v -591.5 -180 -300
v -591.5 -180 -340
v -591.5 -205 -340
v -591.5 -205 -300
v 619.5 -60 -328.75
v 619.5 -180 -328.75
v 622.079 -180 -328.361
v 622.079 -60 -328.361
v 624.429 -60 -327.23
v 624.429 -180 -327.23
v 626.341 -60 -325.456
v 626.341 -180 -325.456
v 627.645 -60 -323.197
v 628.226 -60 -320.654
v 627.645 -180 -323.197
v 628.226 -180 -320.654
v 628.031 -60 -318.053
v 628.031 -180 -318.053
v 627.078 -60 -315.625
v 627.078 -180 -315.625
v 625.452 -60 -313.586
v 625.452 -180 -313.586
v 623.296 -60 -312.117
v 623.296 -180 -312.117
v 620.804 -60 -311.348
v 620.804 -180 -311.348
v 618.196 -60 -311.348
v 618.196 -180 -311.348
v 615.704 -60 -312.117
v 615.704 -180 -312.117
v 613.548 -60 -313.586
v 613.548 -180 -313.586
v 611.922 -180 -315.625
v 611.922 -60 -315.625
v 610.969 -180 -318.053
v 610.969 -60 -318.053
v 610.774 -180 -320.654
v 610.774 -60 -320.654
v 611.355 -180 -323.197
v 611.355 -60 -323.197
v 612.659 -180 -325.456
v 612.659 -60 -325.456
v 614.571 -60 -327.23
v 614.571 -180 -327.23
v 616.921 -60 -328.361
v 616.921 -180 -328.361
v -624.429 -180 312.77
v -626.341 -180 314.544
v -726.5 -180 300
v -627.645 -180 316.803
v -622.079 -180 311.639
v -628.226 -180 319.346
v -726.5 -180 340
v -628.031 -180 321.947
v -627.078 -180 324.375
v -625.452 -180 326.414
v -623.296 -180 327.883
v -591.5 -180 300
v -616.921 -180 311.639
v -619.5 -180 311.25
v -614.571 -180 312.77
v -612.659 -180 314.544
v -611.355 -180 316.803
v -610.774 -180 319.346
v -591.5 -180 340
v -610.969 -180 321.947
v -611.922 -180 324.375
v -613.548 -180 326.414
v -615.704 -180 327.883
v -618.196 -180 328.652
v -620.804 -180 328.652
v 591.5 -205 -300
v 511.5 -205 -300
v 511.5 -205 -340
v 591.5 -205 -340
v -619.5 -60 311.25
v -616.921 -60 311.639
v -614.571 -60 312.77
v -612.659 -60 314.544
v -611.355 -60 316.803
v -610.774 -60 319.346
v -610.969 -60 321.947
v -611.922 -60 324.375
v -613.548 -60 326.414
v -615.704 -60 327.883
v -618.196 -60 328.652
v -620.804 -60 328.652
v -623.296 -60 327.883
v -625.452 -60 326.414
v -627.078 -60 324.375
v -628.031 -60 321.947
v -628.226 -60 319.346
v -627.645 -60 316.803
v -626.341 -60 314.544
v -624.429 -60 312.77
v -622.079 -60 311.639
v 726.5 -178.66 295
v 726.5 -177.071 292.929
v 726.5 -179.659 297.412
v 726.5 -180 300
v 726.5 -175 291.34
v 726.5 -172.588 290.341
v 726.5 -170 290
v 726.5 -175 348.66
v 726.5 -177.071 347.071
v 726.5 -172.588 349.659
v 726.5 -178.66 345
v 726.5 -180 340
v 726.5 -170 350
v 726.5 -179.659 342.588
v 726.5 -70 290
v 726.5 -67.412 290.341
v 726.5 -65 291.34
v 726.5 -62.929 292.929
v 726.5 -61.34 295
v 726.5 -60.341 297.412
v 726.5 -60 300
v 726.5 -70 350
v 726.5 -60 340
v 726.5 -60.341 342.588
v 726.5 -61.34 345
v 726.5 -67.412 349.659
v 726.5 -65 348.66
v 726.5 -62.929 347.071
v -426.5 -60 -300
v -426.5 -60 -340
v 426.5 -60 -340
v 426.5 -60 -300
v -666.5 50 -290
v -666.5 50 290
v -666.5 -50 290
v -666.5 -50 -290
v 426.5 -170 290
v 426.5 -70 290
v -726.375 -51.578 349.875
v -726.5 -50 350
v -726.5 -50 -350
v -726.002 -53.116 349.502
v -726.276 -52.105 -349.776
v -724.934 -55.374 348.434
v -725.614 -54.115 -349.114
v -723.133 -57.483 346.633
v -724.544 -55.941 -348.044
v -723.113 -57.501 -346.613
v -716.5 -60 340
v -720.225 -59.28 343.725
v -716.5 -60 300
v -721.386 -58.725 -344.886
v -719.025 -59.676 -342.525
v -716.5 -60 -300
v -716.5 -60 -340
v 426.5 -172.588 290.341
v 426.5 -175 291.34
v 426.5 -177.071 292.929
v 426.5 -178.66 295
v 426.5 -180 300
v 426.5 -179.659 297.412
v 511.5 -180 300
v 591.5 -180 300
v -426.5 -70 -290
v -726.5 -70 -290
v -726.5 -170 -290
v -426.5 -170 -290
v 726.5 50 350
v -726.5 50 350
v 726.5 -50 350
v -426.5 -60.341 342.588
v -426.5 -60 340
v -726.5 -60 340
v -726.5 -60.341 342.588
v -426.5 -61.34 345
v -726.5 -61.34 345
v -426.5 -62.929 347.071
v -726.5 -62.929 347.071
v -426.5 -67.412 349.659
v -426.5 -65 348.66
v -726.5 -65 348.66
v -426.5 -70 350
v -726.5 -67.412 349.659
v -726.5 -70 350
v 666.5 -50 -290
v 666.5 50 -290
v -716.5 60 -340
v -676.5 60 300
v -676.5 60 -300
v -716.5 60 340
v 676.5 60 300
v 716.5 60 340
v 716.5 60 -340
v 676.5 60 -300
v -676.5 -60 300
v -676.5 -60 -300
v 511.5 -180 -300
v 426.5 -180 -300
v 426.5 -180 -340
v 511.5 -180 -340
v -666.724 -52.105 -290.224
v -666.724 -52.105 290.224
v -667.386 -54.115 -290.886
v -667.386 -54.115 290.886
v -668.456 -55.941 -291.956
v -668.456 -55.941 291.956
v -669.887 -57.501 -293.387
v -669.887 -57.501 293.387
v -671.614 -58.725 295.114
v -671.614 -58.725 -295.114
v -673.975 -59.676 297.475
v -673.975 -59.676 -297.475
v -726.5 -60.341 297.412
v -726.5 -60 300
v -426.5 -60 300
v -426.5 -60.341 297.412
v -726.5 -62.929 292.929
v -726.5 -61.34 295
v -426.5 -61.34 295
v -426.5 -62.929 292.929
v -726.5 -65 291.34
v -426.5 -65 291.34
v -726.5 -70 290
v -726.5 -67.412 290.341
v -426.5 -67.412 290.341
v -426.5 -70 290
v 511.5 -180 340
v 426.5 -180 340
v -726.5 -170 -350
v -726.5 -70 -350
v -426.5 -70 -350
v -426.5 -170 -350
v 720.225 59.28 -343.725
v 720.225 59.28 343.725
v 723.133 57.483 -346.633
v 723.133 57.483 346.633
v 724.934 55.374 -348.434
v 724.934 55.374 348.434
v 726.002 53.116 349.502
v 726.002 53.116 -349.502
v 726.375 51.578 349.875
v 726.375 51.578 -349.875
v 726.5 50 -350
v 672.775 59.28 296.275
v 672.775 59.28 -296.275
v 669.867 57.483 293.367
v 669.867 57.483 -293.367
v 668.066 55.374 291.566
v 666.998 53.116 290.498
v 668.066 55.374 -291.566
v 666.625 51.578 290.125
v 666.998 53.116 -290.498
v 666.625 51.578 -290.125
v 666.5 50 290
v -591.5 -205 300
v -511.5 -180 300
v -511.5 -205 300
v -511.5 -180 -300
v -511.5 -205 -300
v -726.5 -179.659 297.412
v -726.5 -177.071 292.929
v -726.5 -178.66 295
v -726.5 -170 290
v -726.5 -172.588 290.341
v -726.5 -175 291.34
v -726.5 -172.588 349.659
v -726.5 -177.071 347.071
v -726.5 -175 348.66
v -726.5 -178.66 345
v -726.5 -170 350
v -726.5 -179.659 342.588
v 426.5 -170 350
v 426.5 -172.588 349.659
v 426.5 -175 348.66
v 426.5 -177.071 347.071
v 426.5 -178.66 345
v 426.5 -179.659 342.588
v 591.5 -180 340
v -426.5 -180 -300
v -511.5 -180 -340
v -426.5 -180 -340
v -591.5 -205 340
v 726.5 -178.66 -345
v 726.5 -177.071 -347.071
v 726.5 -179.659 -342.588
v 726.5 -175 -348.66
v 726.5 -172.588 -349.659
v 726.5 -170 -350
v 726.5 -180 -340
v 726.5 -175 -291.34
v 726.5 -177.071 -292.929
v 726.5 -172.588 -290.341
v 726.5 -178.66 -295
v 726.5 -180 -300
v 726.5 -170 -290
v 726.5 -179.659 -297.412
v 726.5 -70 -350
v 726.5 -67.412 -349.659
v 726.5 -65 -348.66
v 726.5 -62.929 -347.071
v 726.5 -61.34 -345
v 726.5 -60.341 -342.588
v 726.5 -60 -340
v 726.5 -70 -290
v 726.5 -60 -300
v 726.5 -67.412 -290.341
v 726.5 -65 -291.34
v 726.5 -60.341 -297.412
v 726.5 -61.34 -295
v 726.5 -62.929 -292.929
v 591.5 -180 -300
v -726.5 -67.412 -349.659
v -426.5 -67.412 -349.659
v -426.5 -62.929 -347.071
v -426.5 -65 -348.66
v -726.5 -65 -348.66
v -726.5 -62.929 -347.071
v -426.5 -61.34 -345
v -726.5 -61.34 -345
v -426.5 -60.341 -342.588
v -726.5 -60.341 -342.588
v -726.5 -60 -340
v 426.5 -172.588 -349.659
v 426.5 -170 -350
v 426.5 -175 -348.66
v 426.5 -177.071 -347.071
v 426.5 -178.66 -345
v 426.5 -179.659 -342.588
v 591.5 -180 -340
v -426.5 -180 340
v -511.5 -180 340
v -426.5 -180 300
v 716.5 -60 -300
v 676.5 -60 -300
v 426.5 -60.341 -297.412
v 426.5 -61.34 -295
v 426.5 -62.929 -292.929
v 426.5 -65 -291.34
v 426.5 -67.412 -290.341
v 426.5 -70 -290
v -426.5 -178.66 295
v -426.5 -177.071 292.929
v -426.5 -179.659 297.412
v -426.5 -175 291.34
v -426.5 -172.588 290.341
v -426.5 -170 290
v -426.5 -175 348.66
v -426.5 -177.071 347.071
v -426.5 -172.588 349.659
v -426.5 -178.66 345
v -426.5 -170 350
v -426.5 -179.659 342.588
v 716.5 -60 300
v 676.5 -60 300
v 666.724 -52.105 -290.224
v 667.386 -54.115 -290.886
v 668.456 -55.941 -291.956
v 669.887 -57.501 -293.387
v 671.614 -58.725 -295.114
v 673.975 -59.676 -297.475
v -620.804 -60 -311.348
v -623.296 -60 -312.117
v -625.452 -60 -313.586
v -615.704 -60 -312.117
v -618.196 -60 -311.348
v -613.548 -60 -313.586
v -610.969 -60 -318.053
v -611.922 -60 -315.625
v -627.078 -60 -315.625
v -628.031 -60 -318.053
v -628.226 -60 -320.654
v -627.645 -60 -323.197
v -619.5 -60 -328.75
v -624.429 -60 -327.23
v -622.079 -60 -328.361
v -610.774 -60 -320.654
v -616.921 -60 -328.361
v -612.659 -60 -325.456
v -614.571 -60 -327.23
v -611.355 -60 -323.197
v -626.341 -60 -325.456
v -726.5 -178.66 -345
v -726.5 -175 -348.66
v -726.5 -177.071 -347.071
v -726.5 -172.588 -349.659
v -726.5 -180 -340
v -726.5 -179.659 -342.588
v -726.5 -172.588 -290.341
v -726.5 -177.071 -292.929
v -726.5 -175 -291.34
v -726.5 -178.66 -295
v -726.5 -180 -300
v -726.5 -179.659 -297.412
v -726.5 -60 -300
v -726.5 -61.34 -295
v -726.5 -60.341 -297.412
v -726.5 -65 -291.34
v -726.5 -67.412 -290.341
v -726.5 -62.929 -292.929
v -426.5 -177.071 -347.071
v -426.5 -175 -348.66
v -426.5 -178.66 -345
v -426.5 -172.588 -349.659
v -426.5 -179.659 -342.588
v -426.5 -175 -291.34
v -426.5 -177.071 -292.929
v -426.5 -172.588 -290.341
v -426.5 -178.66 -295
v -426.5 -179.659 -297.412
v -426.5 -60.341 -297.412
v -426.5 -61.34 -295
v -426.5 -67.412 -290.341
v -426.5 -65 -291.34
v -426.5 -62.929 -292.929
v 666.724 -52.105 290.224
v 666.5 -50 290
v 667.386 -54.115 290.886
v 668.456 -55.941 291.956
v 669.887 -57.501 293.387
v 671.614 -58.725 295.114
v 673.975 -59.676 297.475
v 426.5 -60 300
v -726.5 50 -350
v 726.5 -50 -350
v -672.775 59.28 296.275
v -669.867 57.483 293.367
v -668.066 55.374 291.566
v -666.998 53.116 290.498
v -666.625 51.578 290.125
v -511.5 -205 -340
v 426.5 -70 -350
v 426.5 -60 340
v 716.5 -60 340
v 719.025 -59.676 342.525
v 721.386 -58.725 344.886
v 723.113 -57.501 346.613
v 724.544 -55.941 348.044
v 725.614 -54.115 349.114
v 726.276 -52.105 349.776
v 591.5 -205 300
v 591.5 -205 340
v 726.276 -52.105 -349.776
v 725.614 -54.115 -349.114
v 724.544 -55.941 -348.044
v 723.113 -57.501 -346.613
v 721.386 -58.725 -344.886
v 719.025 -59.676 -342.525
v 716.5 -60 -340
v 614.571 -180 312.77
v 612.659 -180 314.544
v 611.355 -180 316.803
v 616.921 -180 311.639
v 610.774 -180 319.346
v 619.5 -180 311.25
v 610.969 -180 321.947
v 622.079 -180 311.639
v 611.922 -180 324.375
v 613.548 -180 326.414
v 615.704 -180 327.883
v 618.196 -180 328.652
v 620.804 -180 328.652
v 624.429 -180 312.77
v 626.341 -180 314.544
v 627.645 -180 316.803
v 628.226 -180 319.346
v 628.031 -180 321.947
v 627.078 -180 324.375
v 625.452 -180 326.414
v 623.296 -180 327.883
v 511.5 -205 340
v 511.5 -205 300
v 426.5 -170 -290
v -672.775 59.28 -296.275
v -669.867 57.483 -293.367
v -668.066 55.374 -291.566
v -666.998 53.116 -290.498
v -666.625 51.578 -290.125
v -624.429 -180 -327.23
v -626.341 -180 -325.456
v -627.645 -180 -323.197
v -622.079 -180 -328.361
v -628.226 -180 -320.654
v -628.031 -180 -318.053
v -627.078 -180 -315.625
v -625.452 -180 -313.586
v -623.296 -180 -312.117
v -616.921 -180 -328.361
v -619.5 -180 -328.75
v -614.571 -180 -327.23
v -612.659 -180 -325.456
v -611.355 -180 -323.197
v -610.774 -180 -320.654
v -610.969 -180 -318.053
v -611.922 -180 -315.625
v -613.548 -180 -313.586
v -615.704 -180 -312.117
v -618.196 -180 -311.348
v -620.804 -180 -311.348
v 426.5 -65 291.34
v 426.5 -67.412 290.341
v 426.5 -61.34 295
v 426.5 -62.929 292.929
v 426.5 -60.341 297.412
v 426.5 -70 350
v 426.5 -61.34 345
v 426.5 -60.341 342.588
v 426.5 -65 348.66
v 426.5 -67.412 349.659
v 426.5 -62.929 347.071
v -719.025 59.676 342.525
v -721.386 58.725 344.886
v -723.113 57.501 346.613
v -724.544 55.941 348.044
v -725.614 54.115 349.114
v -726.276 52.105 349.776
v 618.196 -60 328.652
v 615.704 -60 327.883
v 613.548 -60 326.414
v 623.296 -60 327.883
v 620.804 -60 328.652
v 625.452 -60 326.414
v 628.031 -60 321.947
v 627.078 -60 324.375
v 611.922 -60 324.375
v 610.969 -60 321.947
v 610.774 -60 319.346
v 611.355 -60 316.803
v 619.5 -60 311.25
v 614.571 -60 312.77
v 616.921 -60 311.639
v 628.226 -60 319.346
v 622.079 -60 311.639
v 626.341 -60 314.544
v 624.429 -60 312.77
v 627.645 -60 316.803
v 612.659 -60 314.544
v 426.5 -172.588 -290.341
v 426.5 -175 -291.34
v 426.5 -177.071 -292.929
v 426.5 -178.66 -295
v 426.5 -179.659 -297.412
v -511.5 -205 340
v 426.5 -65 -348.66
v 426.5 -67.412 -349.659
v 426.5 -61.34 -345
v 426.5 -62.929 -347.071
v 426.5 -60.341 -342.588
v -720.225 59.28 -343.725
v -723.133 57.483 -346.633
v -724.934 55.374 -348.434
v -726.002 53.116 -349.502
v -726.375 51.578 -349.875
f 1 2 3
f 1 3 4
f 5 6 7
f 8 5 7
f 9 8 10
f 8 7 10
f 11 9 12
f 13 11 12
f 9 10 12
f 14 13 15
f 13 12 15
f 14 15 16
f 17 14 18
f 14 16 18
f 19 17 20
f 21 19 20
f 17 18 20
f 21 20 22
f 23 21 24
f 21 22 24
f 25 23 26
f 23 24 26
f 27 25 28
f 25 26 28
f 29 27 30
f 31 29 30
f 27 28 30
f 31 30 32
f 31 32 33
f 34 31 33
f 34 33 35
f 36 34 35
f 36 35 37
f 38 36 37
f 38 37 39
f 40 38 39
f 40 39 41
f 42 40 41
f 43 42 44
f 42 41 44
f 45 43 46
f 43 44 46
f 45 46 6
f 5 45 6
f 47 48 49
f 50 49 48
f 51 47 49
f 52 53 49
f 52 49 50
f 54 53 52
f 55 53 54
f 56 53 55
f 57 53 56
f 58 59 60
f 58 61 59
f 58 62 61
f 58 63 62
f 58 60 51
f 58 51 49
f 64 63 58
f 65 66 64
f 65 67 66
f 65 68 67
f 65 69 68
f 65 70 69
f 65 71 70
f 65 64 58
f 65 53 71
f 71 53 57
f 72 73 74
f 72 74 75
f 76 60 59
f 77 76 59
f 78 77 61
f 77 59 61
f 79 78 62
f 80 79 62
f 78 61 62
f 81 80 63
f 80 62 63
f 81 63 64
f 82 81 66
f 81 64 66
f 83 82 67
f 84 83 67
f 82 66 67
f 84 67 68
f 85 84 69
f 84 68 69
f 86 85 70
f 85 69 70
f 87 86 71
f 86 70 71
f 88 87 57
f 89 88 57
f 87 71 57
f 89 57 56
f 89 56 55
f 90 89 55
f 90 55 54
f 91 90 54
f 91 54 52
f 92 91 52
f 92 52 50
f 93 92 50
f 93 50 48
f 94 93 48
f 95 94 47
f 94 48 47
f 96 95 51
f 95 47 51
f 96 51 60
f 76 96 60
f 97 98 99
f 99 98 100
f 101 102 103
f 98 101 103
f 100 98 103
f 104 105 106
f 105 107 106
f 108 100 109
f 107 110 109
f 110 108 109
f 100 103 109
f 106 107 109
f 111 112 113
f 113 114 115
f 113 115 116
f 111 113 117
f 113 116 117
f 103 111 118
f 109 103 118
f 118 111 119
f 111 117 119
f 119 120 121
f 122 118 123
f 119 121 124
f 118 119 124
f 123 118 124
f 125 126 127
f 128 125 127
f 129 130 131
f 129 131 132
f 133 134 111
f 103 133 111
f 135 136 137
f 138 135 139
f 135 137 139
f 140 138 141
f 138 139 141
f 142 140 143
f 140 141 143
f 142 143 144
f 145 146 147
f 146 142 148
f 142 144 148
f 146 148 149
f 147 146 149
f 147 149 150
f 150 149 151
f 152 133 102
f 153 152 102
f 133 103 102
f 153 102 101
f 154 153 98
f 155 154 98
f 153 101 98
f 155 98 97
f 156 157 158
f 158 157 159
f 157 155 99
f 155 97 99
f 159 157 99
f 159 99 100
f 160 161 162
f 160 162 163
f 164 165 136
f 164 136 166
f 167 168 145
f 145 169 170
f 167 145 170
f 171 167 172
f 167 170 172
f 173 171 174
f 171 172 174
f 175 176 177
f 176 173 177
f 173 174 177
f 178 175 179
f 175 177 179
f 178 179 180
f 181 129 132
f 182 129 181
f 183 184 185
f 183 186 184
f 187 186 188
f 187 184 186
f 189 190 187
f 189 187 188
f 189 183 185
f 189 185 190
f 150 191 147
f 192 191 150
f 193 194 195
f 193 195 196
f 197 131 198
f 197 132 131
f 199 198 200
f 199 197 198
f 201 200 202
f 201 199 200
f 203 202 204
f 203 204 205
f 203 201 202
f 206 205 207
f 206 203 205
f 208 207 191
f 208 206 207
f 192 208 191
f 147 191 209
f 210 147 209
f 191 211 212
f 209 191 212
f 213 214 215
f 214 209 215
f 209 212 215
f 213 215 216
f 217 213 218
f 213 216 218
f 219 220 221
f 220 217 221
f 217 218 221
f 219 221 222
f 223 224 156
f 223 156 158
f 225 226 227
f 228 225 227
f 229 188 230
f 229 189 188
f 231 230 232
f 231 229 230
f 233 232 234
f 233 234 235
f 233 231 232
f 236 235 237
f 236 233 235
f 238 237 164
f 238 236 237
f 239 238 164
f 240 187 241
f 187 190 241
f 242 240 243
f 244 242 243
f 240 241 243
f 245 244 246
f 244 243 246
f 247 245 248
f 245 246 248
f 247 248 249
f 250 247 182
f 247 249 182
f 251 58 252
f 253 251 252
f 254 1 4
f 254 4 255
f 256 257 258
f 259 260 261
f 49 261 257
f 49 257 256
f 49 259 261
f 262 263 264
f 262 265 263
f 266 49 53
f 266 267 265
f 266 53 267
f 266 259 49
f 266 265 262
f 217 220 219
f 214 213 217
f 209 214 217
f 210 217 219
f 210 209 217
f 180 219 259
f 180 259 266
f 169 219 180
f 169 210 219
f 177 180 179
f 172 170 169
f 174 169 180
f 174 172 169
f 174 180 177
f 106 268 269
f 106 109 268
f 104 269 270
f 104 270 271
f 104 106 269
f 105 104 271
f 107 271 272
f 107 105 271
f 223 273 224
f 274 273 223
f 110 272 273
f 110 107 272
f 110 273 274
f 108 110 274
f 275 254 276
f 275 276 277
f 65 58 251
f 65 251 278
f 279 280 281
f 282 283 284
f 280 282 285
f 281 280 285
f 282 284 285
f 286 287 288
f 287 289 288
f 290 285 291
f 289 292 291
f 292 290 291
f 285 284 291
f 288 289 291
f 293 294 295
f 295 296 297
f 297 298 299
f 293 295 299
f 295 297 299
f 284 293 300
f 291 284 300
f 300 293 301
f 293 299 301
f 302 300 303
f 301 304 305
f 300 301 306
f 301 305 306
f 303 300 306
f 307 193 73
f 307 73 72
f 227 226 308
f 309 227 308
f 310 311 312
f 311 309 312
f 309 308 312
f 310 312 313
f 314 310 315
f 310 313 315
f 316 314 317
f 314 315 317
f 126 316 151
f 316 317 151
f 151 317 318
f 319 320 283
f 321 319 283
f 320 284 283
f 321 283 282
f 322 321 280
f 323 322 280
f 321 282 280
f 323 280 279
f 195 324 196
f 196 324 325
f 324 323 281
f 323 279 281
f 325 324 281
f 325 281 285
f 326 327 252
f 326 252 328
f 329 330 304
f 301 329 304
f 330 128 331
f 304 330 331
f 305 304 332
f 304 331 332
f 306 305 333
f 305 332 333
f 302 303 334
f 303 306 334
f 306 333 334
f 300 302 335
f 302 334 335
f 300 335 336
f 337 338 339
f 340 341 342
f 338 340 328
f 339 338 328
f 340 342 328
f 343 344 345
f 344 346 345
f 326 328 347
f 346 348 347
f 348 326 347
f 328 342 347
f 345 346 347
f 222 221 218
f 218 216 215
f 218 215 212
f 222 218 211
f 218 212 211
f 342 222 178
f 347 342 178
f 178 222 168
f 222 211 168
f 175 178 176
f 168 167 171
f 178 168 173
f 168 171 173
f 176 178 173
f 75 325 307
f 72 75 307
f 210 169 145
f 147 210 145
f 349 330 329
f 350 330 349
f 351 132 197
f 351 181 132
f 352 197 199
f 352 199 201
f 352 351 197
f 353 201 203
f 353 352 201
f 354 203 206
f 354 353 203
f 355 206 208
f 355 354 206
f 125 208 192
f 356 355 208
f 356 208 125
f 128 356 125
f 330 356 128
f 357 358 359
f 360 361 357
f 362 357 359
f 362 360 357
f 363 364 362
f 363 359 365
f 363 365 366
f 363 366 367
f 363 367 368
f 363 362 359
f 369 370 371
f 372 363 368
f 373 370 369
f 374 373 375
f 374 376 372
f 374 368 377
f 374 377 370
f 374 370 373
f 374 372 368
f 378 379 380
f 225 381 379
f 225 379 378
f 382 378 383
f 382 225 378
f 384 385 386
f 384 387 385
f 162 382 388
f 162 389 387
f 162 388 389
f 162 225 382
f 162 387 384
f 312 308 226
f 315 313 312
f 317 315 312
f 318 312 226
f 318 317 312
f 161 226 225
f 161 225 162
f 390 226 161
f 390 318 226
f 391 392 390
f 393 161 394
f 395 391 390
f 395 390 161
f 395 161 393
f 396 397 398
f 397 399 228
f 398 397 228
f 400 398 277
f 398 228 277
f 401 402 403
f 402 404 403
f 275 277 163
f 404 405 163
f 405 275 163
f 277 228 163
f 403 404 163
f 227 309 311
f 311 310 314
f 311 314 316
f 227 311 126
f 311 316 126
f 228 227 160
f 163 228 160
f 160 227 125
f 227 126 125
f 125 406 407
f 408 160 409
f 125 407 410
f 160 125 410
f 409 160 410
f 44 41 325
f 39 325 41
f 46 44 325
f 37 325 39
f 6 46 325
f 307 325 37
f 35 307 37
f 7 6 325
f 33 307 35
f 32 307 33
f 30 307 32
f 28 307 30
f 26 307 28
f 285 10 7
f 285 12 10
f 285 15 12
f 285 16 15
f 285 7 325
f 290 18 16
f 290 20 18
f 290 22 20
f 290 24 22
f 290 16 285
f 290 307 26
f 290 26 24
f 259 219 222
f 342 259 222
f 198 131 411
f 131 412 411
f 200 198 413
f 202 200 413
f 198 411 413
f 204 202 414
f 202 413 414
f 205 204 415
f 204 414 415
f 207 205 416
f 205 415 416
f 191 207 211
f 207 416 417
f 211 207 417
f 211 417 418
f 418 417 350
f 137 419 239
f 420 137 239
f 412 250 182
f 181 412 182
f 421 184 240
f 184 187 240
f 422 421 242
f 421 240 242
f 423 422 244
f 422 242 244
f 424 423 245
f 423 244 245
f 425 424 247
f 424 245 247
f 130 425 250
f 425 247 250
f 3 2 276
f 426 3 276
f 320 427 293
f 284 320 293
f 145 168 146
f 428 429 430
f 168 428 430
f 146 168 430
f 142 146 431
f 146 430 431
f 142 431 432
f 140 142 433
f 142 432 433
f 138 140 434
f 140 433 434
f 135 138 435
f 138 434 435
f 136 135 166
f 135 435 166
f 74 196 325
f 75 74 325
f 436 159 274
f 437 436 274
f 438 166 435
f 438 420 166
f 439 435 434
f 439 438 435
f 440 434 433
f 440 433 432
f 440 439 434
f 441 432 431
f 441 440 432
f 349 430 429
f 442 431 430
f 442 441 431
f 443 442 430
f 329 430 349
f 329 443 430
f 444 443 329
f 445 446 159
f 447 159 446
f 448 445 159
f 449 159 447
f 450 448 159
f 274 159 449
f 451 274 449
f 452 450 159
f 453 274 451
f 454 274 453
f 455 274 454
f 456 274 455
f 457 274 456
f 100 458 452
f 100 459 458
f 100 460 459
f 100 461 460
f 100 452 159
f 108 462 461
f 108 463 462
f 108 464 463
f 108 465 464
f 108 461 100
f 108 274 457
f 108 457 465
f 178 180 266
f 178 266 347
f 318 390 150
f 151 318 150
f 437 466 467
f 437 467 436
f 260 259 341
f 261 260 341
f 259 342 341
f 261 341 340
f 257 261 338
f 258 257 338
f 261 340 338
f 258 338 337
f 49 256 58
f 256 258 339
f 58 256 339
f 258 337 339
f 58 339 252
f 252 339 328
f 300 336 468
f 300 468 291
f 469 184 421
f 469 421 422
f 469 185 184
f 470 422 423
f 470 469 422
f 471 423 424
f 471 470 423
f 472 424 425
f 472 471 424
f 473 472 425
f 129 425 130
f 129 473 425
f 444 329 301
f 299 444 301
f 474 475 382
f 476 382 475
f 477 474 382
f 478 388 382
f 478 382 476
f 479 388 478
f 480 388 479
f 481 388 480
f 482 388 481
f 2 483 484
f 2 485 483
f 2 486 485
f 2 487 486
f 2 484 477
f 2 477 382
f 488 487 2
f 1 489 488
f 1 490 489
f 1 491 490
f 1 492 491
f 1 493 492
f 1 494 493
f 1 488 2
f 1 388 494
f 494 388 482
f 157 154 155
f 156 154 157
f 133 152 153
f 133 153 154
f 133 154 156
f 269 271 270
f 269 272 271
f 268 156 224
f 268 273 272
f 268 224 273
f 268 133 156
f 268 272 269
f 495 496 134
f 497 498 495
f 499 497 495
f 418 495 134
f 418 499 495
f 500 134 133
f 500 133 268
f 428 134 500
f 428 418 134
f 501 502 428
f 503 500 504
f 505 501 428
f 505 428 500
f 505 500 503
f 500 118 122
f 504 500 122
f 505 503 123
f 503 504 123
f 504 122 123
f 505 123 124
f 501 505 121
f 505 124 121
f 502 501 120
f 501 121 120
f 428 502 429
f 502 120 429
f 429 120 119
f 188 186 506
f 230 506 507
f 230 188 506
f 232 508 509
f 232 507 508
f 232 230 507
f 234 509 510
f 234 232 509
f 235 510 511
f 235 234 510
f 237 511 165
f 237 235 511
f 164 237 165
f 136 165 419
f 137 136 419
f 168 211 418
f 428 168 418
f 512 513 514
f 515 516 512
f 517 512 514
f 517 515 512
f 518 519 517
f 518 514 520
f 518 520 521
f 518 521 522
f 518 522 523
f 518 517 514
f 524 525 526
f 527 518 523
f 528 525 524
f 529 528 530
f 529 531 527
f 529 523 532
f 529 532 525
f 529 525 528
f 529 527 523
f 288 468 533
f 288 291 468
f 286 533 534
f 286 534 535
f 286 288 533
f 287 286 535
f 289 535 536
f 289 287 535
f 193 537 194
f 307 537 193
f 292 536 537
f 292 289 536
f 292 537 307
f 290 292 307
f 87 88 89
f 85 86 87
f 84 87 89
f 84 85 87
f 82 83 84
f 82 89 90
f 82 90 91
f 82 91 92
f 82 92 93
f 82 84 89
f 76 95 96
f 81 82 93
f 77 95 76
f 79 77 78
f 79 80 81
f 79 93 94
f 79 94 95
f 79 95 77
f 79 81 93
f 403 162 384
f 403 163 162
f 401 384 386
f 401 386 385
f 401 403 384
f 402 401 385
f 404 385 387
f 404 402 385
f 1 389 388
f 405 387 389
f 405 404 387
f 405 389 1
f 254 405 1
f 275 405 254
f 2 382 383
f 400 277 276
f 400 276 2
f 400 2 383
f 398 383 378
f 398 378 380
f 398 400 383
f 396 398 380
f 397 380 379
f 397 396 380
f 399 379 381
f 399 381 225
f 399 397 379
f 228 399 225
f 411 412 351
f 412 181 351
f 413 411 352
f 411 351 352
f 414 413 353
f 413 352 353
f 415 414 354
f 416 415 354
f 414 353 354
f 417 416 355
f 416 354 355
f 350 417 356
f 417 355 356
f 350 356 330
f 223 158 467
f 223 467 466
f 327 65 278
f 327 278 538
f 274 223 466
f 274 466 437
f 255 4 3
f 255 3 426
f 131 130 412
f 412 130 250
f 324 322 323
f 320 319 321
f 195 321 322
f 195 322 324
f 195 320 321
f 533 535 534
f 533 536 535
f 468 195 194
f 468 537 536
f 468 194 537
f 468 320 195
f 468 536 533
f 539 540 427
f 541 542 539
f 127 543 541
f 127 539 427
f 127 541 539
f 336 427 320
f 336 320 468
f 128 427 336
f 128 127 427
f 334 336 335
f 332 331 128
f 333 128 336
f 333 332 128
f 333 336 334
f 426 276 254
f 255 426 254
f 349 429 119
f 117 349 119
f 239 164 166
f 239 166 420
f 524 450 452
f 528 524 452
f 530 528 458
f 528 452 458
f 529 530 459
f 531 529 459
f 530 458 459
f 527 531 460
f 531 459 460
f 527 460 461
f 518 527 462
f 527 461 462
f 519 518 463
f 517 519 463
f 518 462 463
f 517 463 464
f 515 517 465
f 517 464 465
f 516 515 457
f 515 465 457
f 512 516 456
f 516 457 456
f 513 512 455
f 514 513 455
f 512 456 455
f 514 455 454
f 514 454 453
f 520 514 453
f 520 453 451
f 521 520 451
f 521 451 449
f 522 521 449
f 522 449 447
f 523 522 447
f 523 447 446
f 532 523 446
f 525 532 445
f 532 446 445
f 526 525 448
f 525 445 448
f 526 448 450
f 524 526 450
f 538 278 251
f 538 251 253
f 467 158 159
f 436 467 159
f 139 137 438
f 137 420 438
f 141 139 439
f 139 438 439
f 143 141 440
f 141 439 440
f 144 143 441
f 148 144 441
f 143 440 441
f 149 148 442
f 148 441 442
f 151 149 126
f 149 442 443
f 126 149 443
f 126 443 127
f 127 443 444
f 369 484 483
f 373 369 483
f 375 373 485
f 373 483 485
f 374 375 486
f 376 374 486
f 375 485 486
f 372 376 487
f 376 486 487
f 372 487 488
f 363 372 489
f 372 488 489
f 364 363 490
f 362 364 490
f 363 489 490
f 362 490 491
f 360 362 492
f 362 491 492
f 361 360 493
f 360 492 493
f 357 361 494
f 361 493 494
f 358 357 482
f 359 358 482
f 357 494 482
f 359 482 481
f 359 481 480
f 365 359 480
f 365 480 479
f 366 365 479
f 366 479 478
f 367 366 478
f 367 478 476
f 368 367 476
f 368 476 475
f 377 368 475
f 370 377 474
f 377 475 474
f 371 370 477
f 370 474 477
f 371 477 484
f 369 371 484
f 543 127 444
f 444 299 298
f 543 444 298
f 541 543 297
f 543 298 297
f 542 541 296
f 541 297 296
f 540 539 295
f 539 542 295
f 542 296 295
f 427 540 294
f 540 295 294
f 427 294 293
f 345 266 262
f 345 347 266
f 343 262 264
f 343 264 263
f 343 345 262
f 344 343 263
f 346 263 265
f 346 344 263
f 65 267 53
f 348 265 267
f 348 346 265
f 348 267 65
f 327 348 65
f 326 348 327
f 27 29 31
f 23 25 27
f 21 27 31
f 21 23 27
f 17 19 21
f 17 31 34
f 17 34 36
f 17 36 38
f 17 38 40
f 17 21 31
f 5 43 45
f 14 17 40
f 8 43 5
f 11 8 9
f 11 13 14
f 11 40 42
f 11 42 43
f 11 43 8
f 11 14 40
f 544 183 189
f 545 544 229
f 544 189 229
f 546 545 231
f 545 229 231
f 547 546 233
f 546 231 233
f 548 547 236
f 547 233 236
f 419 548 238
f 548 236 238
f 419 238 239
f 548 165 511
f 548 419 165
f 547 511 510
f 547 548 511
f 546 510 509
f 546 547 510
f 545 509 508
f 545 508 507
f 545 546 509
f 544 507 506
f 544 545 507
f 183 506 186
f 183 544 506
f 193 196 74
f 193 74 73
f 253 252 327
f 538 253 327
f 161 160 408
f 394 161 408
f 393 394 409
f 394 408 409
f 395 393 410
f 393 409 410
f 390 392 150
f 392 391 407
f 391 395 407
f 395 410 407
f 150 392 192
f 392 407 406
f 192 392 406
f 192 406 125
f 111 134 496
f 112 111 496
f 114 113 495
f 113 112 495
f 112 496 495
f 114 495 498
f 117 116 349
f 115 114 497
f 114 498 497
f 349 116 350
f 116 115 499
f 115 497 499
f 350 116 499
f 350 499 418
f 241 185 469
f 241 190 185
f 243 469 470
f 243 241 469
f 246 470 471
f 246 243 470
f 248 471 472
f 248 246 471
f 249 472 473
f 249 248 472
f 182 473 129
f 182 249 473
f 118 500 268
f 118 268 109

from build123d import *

# Parameters (mm, degrees)
SKIZZE1_W                       = 1453
SKIZZE1_H                       = 700
SKIZZE1_W_2                     = 1333
SKIZZE1_H_2                     = 580
AUFSATZ_LINEAR_AUSTRAGEN1_DEPTH = 60
VERRUNDUNG1_R                   = 10
SKIZZE2_W                       = 300
SKIZZE2_H                       = 60
AUFSATZ_LINEAR_AUSTRAGEN2_DEPTH = 120
VERRUNDUNG3_R                   = 10
VERRUNDUNG4_R                   = 10
SKIZZE3_R                       = 8.75
SCHNITT_LINEAR_AUSTRAGEN1_DEPTH = 120
SKIZZE4_W                       = 80
SKIZZE4_H                       = 40
AUFSATZ_LINEAR_AUSTRAGEN3_DEPTH = 25


with BuildPart() as part:
    # Skizze1 → Aufsatz-Linear austragen1 (new, symmetric)
    with BuildSketch(Plane(origin=(0, 0, 0), x_dir=(1, 0, 0), z_dir=(0, 1, 0))):
        Rectangle(SKIZZE1_W, SKIZZE1_H)
        Rectangle(SKIZZE1_W_2, SKIZZE1_H_2, mode=Mode.SUBTRACT)
    extrude(amount=AUFSATZ_LINEAR_AUSTRAGEN1_DEPTH, both=True)

    # Verrundung1
    verrundung1_edges = [part.edges().sort_by_distance(p)[0] for p in [
        (726.5, 60, 0),
        (0, 60, -350),
        (-666.5, -60, 0),
        (0, -60, 290),
        (666.5, -60, 0),
        (0, -60, -290),
        (-666.5, 60, 0),
        (0, 60, 290),
        (666.5, 60, 0),
        (0, 60, -290),
        (-726.5, 60, 0),
        (0, -60, -350),
        (726.5, -60, 0),
        (0, -60, 350),
        (-726.5, -60, 0),
        (0, 60, 350),
    ]]
    fillet(verrundung1_edges, radius=VERRUNDUNG1_R)

    # Skizze2 → Aufsatz-Linear austragen2 (add)
    with BuildSketch(Plane.XZ.offset(60)):
        with Locations((-576.5, 320)):
            Rectangle(SKIZZE2_W, SKIZZE2_H)
        with Locations((576.5, 320)):
            Rectangle(SKIZZE2_W, SKIZZE2_H)
        with Locations((576.5, -320)):
            Rectangle(SKIZZE2_W, SKIZZE2_H)
        with Locations((-576.5, -320)):
            Rectangle(SKIZZE2_W, SKIZZE2_H)
    extrude(amount=AUFSATZ_LINEAR_AUSTRAGEN2_DEPTH)

    # Verrundung3
    verrundung3_edges = [part.edges().sort_by_distance(p)[0] for p in [
        (576.5, -180, 290),
        (576.5, -180, -290),
        (576.5, -180, -350),
        (-576.5, -180, -350),
        (-576.5, -180, -290),
        (-576.5, -180, 290),
        (-576.5, -180, 350),
        (576.5, -180, 350),
    ]]
    fillet(verrundung3_edges, radius=VERRUNDUNG3_R)

    # Verrundung4
    # the kernel refuses this fillet: 10 mm, written as the material it adds along each edge
    # the kernel refuses this fillet: 10 mm, written as the material it takes off along each edge
    with BuildSketch(Plane(origin=(691.5, -60, -290), x_dir=(0, 0, -1), z_dir=(1, 0, 0)), Plane(origin=(-691.5, -60, -290), x_dir=(0, -1, 0), z_dir=(-1, 0, 0))) as verrundung4_2_piece_1:
        with BuildLine():
            CenterArc((VERRUNDUNG4_R, -VERRUNDUNG4_R), VERRUNDUNG4_R, 90, 90)
            Line((0, -VERRUNDUNG4_R), (0, 0))
            Line((0, 0), (VERRUNDUNG4_R, 0))
        make_face()
    extrude(amount=60, mode=Mode.SUBTRACT)
    with BuildSketch(Plane(origin=(401.5, -60, -290), x_dir=(0, 0, -1), z_dir=(1, 0, 0)), Plane(origin=(-401.5, -60, -290), x_dir=(0, -1, 0), z_dir=(-1, 0, 0))) as verrundung4_2_piece_2:
        with BuildLine():
            CenterArc((VERRUNDUNG4_R, -VERRUNDUNG4_R), VERRUNDUNG4_R, 90, 90)
            Line((0, -VERRUNDUNG4_R), (0, 0))
            Line((0, 0), (VERRUNDUNG4_R, 0))
        make_face()
    extrude(amount=300, mode=Mode.SUBTRACT)
    with BuildSketch(Plane(origin=(751.5, -60, -350), x_dir=(0, 0, 1), z_dir=(-1, 0, 0)), Plane(origin=(-751.5, -60, 350), x_dir=(0, 0, -1), z_dir=(1, 0, 0))) as verrundung4_2_piece_3:
        with BuildLine():
            CenterArc((VERRUNDUNG4_R, -VERRUNDUNG4_R), VERRUNDUNG4_R, 90, 90)
            Line((0, -VERRUNDUNG4_R), (0, 0))
            Line((0, 0), (VERRUNDUNG4_R, 0))
        make_face()
    extrude(amount=350, mode=Mode.SUBTRACT)
    with BuildSketch(Plane(origin=(-751.5, -60, -350), x_dir=(0, 0, 1), z_dir=(1, 0, 0)), Plane(origin=(751.5, -60, 350), x_dir=(0, 0, -1), z_dir=(-1, 0, 0))) as verrundung4_2_piece_4:
        with BuildLine():
            CenterArc((VERRUNDUNG4_R, VERRUNDUNG4_R), VERRUNDUNG4_R, 180, 90)
            Line((0, VERRUNDUNG4_R), (0, 0))
            Line((0, 0), (VERRUNDUNG4_R, 0))
        make_face()
    extrude(amount=350, mode=Mode.SUBTRACT)
    with BuildSketch(Plane(origin=(-691.5, -60, 290), x_dir=(0, -1, 0), z_dir=(-1, 0, 0)), Plane(origin=(691.5, -60, 290), x_dir=(0, 0, 1), z_dir=(1, 0, 0))) as verrundung4_2_piece_5:
        with BuildLine():
            CenterArc((VERRUNDUNG4_R, VERRUNDUNG4_R), VERRUNDUNG4_R, 180, 90)
            Line((0, VERRUNDUNG4_R), (0, 0))
            Line((0, 0), (VERRUNDUNG4_R, 0))
        make_face()
    extrude(amount=60, mode=Mode.SUBTRACT)
    with BuildSketch(Plane(origin=(-401.5, -60, 290), x_dir=(0, -1, 0), z_dir=(-1, 0, 0)), Plane(origin=(401.5, -60, 290), x_dir=(0, 0, 1), z_dir=(1, 0, 0))) as verrundung4_2_piece_6:
        with BuildLine():
            CenterArc((VERRUNDUNG4_R, VERRUNDUNG4_R), VERRUNDUNG4_R, 180, 90)
            Line((0, VERRUNDUNG4_R), (0, 0))
            Line((0, 0), (VERRUNDUNG4_R, 0))
        make_face()
    extrude(amount=300, mode=Mode.SUBTRACT)

    # Skizze3 → Schnitt-Linear austragen1 (cut)
    with BuildSketch(Plane.XZ.offset(180)):
        with Locations(Location((-619.5, 320, 0), (0, 0, 270))):
            Circle(SKIZZE3_R)
        with Locations(Location((-619.5, -320, 0), (0, 0, 270))):
            Circle(SKIZZE3_R)
        with Locations(Location((619.5, 320, 0), (0, 0, 270))):
            Circle(SKIZZE3_R)
        with Locations(Location((619.5, -320, 0), (0, 0, 270))):
            Circle(SKIZZE3_R)
    extrude(amount=-SCHNITT_LINEAR_AUSTRAGEN1_DEPTH, mode=Mode.SUBTRACT)

    # Skizze4 → Aufsatz-Linear austragen3 (add)
    with BuildSketch(Plane.XZ.offset(180)):
        with Locations((-551.5, 320)):
            Rectangle(SKIZZE4_W, SKIZZE4_H)
        with Locations((551.5, 320)):
            Rectangle(SKIZZE4_W, SKIZZE4_H)
        with Locations((551.5, -320)):
            Rectangle(SKIZZE4_W, SKIZZE4_H)
        with Locations((-551.5, -320)):
            Rectangle(SKIZZE4_W, SKIZZE4_H)
    extrude(amount=AUFSATZ_LINEAR_AUSTRAGEN3_DEPTH)


solid = part.part
